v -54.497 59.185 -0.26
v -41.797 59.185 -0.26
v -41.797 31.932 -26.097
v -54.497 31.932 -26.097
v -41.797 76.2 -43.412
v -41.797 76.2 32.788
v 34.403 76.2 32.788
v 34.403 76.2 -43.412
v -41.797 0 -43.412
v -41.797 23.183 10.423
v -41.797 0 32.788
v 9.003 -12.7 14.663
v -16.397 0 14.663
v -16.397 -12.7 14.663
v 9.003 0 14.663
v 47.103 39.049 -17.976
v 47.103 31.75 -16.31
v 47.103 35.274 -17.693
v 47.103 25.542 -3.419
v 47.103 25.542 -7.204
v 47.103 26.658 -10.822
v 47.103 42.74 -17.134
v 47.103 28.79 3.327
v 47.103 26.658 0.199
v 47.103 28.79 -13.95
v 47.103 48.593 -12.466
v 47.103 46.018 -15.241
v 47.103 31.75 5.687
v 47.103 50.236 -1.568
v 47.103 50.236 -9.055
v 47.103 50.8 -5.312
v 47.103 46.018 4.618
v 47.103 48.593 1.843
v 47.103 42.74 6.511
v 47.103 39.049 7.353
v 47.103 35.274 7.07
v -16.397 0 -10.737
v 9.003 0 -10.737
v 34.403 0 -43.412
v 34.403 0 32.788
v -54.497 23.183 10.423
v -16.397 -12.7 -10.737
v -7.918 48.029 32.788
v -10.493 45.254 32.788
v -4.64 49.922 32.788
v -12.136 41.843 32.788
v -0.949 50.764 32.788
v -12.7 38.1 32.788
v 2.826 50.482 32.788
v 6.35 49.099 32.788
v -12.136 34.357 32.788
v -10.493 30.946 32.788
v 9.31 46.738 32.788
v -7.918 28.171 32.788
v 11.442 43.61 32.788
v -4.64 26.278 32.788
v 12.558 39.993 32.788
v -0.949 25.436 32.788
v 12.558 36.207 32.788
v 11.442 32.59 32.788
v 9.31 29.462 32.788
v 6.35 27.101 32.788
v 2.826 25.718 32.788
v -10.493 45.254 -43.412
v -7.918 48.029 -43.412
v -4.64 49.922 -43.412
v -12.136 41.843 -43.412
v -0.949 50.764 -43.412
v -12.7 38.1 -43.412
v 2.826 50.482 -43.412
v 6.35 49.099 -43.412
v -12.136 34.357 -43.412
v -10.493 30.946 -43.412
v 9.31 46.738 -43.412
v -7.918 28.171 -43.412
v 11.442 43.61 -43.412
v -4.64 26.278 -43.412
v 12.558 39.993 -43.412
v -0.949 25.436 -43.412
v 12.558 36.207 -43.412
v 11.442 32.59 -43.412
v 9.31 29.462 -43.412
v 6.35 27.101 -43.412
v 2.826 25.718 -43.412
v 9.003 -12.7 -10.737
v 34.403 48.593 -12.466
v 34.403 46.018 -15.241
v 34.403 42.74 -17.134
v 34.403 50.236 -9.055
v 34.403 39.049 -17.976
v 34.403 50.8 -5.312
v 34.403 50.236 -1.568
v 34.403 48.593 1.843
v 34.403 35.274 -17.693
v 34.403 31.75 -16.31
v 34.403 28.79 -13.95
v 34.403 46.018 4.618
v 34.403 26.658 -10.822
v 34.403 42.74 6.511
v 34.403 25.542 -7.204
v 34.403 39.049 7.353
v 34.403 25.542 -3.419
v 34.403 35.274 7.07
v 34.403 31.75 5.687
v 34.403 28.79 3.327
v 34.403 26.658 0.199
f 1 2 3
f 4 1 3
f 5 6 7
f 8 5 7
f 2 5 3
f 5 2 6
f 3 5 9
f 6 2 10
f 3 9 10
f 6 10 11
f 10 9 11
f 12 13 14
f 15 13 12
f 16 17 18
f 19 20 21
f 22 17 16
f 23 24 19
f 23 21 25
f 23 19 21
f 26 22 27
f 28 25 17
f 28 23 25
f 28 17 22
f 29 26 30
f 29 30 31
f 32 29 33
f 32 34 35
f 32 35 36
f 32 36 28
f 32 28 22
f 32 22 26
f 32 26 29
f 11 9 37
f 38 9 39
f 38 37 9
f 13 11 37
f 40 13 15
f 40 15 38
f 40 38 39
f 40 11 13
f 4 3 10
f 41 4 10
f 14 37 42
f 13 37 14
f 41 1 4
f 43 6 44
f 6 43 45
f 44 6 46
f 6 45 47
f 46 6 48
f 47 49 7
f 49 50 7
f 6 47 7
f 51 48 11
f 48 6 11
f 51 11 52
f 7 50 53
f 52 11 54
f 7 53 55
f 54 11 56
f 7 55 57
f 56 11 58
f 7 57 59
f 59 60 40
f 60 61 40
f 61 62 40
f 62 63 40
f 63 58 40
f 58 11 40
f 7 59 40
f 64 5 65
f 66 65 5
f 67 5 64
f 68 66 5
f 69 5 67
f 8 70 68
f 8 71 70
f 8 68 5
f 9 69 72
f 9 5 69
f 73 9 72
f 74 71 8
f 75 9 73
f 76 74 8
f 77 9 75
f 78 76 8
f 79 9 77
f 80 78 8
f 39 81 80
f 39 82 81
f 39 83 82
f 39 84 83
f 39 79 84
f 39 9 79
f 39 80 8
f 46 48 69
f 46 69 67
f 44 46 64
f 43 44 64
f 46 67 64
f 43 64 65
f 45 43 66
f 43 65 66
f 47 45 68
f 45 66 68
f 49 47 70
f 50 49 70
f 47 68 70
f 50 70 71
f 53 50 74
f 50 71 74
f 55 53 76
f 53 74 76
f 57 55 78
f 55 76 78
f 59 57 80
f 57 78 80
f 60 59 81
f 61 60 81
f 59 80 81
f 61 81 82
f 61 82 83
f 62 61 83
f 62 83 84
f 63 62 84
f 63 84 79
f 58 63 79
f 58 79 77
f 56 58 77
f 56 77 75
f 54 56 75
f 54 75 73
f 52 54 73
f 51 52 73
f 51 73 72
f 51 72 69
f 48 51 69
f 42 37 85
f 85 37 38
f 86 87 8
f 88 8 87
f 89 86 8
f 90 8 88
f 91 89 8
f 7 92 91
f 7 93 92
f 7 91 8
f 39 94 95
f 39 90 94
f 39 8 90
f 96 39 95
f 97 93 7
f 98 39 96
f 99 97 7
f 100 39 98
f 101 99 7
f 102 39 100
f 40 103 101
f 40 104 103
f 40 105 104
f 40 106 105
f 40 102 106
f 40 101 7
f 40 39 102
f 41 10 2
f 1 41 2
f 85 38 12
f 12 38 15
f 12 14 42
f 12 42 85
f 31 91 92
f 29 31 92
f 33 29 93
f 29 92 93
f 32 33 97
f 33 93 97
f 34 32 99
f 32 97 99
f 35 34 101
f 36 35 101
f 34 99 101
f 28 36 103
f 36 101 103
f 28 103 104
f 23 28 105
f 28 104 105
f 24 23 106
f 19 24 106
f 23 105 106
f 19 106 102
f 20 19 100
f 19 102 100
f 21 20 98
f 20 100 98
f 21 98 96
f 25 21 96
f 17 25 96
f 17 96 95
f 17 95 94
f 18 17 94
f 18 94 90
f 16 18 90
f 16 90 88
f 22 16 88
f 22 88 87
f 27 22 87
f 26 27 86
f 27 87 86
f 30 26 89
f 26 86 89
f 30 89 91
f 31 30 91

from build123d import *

# Parameters (mm, degrees)
F0_W     = 76.2
F0_H     = 76.2
F1_DEPTH = 76.2
F2_W     = 25.4
F2_H     = 25.4
F3_DEPTH = 12.7
F4_R     = 12.7
F5_DEPTH = 12.7
F7_D     = 25.4
F9_DEPTH = 12.7


with BuildPart() as f1:
    # F0 (on Front) → F1 (new body)
    with BuildSketch(Plane.XZ):
        with Locations((-3.697144, -5.31157)):
            Rectangle(F0_W, F0_H)
    extrude(amount=-F1_DEPTH)

    # F2 (on face) → F3 (join)
    with BuildSketch(Plane.XZ):
        with Locations((-3.697144, 1.963377)):
            Rectangle(F2_W, F2_H)
    extrude(amount=F3_DEPTH)

    # F4 (on face) → F5 (join)
    with BuildSketch(Plane.YZ.offset(34.402856)):
        with Locations((38.1, -5.31157)):
            Circle(F4_R)
    extrude(amount=F5_DEPTH)

    # F7 (through all)
    with Locations(Plane.XY.offset(32.78843)):
        with Locations((0, 38.1)):
            Hole(F7_D / 2)

    # F8 (on face) → F9 (join)
    with BuildSketch(Plane(origin=(-41.797144, 0, 0), x_dir=(0, -1, 0), z_dir=(-1, 0, 0))):
        Polygon((-59.184786, -0.260271), (-31.93216, -26.097179), (-23.183054, 10.422741), align=None)
    extrude(amount=F9_DEPTH)


solid = f1.part
